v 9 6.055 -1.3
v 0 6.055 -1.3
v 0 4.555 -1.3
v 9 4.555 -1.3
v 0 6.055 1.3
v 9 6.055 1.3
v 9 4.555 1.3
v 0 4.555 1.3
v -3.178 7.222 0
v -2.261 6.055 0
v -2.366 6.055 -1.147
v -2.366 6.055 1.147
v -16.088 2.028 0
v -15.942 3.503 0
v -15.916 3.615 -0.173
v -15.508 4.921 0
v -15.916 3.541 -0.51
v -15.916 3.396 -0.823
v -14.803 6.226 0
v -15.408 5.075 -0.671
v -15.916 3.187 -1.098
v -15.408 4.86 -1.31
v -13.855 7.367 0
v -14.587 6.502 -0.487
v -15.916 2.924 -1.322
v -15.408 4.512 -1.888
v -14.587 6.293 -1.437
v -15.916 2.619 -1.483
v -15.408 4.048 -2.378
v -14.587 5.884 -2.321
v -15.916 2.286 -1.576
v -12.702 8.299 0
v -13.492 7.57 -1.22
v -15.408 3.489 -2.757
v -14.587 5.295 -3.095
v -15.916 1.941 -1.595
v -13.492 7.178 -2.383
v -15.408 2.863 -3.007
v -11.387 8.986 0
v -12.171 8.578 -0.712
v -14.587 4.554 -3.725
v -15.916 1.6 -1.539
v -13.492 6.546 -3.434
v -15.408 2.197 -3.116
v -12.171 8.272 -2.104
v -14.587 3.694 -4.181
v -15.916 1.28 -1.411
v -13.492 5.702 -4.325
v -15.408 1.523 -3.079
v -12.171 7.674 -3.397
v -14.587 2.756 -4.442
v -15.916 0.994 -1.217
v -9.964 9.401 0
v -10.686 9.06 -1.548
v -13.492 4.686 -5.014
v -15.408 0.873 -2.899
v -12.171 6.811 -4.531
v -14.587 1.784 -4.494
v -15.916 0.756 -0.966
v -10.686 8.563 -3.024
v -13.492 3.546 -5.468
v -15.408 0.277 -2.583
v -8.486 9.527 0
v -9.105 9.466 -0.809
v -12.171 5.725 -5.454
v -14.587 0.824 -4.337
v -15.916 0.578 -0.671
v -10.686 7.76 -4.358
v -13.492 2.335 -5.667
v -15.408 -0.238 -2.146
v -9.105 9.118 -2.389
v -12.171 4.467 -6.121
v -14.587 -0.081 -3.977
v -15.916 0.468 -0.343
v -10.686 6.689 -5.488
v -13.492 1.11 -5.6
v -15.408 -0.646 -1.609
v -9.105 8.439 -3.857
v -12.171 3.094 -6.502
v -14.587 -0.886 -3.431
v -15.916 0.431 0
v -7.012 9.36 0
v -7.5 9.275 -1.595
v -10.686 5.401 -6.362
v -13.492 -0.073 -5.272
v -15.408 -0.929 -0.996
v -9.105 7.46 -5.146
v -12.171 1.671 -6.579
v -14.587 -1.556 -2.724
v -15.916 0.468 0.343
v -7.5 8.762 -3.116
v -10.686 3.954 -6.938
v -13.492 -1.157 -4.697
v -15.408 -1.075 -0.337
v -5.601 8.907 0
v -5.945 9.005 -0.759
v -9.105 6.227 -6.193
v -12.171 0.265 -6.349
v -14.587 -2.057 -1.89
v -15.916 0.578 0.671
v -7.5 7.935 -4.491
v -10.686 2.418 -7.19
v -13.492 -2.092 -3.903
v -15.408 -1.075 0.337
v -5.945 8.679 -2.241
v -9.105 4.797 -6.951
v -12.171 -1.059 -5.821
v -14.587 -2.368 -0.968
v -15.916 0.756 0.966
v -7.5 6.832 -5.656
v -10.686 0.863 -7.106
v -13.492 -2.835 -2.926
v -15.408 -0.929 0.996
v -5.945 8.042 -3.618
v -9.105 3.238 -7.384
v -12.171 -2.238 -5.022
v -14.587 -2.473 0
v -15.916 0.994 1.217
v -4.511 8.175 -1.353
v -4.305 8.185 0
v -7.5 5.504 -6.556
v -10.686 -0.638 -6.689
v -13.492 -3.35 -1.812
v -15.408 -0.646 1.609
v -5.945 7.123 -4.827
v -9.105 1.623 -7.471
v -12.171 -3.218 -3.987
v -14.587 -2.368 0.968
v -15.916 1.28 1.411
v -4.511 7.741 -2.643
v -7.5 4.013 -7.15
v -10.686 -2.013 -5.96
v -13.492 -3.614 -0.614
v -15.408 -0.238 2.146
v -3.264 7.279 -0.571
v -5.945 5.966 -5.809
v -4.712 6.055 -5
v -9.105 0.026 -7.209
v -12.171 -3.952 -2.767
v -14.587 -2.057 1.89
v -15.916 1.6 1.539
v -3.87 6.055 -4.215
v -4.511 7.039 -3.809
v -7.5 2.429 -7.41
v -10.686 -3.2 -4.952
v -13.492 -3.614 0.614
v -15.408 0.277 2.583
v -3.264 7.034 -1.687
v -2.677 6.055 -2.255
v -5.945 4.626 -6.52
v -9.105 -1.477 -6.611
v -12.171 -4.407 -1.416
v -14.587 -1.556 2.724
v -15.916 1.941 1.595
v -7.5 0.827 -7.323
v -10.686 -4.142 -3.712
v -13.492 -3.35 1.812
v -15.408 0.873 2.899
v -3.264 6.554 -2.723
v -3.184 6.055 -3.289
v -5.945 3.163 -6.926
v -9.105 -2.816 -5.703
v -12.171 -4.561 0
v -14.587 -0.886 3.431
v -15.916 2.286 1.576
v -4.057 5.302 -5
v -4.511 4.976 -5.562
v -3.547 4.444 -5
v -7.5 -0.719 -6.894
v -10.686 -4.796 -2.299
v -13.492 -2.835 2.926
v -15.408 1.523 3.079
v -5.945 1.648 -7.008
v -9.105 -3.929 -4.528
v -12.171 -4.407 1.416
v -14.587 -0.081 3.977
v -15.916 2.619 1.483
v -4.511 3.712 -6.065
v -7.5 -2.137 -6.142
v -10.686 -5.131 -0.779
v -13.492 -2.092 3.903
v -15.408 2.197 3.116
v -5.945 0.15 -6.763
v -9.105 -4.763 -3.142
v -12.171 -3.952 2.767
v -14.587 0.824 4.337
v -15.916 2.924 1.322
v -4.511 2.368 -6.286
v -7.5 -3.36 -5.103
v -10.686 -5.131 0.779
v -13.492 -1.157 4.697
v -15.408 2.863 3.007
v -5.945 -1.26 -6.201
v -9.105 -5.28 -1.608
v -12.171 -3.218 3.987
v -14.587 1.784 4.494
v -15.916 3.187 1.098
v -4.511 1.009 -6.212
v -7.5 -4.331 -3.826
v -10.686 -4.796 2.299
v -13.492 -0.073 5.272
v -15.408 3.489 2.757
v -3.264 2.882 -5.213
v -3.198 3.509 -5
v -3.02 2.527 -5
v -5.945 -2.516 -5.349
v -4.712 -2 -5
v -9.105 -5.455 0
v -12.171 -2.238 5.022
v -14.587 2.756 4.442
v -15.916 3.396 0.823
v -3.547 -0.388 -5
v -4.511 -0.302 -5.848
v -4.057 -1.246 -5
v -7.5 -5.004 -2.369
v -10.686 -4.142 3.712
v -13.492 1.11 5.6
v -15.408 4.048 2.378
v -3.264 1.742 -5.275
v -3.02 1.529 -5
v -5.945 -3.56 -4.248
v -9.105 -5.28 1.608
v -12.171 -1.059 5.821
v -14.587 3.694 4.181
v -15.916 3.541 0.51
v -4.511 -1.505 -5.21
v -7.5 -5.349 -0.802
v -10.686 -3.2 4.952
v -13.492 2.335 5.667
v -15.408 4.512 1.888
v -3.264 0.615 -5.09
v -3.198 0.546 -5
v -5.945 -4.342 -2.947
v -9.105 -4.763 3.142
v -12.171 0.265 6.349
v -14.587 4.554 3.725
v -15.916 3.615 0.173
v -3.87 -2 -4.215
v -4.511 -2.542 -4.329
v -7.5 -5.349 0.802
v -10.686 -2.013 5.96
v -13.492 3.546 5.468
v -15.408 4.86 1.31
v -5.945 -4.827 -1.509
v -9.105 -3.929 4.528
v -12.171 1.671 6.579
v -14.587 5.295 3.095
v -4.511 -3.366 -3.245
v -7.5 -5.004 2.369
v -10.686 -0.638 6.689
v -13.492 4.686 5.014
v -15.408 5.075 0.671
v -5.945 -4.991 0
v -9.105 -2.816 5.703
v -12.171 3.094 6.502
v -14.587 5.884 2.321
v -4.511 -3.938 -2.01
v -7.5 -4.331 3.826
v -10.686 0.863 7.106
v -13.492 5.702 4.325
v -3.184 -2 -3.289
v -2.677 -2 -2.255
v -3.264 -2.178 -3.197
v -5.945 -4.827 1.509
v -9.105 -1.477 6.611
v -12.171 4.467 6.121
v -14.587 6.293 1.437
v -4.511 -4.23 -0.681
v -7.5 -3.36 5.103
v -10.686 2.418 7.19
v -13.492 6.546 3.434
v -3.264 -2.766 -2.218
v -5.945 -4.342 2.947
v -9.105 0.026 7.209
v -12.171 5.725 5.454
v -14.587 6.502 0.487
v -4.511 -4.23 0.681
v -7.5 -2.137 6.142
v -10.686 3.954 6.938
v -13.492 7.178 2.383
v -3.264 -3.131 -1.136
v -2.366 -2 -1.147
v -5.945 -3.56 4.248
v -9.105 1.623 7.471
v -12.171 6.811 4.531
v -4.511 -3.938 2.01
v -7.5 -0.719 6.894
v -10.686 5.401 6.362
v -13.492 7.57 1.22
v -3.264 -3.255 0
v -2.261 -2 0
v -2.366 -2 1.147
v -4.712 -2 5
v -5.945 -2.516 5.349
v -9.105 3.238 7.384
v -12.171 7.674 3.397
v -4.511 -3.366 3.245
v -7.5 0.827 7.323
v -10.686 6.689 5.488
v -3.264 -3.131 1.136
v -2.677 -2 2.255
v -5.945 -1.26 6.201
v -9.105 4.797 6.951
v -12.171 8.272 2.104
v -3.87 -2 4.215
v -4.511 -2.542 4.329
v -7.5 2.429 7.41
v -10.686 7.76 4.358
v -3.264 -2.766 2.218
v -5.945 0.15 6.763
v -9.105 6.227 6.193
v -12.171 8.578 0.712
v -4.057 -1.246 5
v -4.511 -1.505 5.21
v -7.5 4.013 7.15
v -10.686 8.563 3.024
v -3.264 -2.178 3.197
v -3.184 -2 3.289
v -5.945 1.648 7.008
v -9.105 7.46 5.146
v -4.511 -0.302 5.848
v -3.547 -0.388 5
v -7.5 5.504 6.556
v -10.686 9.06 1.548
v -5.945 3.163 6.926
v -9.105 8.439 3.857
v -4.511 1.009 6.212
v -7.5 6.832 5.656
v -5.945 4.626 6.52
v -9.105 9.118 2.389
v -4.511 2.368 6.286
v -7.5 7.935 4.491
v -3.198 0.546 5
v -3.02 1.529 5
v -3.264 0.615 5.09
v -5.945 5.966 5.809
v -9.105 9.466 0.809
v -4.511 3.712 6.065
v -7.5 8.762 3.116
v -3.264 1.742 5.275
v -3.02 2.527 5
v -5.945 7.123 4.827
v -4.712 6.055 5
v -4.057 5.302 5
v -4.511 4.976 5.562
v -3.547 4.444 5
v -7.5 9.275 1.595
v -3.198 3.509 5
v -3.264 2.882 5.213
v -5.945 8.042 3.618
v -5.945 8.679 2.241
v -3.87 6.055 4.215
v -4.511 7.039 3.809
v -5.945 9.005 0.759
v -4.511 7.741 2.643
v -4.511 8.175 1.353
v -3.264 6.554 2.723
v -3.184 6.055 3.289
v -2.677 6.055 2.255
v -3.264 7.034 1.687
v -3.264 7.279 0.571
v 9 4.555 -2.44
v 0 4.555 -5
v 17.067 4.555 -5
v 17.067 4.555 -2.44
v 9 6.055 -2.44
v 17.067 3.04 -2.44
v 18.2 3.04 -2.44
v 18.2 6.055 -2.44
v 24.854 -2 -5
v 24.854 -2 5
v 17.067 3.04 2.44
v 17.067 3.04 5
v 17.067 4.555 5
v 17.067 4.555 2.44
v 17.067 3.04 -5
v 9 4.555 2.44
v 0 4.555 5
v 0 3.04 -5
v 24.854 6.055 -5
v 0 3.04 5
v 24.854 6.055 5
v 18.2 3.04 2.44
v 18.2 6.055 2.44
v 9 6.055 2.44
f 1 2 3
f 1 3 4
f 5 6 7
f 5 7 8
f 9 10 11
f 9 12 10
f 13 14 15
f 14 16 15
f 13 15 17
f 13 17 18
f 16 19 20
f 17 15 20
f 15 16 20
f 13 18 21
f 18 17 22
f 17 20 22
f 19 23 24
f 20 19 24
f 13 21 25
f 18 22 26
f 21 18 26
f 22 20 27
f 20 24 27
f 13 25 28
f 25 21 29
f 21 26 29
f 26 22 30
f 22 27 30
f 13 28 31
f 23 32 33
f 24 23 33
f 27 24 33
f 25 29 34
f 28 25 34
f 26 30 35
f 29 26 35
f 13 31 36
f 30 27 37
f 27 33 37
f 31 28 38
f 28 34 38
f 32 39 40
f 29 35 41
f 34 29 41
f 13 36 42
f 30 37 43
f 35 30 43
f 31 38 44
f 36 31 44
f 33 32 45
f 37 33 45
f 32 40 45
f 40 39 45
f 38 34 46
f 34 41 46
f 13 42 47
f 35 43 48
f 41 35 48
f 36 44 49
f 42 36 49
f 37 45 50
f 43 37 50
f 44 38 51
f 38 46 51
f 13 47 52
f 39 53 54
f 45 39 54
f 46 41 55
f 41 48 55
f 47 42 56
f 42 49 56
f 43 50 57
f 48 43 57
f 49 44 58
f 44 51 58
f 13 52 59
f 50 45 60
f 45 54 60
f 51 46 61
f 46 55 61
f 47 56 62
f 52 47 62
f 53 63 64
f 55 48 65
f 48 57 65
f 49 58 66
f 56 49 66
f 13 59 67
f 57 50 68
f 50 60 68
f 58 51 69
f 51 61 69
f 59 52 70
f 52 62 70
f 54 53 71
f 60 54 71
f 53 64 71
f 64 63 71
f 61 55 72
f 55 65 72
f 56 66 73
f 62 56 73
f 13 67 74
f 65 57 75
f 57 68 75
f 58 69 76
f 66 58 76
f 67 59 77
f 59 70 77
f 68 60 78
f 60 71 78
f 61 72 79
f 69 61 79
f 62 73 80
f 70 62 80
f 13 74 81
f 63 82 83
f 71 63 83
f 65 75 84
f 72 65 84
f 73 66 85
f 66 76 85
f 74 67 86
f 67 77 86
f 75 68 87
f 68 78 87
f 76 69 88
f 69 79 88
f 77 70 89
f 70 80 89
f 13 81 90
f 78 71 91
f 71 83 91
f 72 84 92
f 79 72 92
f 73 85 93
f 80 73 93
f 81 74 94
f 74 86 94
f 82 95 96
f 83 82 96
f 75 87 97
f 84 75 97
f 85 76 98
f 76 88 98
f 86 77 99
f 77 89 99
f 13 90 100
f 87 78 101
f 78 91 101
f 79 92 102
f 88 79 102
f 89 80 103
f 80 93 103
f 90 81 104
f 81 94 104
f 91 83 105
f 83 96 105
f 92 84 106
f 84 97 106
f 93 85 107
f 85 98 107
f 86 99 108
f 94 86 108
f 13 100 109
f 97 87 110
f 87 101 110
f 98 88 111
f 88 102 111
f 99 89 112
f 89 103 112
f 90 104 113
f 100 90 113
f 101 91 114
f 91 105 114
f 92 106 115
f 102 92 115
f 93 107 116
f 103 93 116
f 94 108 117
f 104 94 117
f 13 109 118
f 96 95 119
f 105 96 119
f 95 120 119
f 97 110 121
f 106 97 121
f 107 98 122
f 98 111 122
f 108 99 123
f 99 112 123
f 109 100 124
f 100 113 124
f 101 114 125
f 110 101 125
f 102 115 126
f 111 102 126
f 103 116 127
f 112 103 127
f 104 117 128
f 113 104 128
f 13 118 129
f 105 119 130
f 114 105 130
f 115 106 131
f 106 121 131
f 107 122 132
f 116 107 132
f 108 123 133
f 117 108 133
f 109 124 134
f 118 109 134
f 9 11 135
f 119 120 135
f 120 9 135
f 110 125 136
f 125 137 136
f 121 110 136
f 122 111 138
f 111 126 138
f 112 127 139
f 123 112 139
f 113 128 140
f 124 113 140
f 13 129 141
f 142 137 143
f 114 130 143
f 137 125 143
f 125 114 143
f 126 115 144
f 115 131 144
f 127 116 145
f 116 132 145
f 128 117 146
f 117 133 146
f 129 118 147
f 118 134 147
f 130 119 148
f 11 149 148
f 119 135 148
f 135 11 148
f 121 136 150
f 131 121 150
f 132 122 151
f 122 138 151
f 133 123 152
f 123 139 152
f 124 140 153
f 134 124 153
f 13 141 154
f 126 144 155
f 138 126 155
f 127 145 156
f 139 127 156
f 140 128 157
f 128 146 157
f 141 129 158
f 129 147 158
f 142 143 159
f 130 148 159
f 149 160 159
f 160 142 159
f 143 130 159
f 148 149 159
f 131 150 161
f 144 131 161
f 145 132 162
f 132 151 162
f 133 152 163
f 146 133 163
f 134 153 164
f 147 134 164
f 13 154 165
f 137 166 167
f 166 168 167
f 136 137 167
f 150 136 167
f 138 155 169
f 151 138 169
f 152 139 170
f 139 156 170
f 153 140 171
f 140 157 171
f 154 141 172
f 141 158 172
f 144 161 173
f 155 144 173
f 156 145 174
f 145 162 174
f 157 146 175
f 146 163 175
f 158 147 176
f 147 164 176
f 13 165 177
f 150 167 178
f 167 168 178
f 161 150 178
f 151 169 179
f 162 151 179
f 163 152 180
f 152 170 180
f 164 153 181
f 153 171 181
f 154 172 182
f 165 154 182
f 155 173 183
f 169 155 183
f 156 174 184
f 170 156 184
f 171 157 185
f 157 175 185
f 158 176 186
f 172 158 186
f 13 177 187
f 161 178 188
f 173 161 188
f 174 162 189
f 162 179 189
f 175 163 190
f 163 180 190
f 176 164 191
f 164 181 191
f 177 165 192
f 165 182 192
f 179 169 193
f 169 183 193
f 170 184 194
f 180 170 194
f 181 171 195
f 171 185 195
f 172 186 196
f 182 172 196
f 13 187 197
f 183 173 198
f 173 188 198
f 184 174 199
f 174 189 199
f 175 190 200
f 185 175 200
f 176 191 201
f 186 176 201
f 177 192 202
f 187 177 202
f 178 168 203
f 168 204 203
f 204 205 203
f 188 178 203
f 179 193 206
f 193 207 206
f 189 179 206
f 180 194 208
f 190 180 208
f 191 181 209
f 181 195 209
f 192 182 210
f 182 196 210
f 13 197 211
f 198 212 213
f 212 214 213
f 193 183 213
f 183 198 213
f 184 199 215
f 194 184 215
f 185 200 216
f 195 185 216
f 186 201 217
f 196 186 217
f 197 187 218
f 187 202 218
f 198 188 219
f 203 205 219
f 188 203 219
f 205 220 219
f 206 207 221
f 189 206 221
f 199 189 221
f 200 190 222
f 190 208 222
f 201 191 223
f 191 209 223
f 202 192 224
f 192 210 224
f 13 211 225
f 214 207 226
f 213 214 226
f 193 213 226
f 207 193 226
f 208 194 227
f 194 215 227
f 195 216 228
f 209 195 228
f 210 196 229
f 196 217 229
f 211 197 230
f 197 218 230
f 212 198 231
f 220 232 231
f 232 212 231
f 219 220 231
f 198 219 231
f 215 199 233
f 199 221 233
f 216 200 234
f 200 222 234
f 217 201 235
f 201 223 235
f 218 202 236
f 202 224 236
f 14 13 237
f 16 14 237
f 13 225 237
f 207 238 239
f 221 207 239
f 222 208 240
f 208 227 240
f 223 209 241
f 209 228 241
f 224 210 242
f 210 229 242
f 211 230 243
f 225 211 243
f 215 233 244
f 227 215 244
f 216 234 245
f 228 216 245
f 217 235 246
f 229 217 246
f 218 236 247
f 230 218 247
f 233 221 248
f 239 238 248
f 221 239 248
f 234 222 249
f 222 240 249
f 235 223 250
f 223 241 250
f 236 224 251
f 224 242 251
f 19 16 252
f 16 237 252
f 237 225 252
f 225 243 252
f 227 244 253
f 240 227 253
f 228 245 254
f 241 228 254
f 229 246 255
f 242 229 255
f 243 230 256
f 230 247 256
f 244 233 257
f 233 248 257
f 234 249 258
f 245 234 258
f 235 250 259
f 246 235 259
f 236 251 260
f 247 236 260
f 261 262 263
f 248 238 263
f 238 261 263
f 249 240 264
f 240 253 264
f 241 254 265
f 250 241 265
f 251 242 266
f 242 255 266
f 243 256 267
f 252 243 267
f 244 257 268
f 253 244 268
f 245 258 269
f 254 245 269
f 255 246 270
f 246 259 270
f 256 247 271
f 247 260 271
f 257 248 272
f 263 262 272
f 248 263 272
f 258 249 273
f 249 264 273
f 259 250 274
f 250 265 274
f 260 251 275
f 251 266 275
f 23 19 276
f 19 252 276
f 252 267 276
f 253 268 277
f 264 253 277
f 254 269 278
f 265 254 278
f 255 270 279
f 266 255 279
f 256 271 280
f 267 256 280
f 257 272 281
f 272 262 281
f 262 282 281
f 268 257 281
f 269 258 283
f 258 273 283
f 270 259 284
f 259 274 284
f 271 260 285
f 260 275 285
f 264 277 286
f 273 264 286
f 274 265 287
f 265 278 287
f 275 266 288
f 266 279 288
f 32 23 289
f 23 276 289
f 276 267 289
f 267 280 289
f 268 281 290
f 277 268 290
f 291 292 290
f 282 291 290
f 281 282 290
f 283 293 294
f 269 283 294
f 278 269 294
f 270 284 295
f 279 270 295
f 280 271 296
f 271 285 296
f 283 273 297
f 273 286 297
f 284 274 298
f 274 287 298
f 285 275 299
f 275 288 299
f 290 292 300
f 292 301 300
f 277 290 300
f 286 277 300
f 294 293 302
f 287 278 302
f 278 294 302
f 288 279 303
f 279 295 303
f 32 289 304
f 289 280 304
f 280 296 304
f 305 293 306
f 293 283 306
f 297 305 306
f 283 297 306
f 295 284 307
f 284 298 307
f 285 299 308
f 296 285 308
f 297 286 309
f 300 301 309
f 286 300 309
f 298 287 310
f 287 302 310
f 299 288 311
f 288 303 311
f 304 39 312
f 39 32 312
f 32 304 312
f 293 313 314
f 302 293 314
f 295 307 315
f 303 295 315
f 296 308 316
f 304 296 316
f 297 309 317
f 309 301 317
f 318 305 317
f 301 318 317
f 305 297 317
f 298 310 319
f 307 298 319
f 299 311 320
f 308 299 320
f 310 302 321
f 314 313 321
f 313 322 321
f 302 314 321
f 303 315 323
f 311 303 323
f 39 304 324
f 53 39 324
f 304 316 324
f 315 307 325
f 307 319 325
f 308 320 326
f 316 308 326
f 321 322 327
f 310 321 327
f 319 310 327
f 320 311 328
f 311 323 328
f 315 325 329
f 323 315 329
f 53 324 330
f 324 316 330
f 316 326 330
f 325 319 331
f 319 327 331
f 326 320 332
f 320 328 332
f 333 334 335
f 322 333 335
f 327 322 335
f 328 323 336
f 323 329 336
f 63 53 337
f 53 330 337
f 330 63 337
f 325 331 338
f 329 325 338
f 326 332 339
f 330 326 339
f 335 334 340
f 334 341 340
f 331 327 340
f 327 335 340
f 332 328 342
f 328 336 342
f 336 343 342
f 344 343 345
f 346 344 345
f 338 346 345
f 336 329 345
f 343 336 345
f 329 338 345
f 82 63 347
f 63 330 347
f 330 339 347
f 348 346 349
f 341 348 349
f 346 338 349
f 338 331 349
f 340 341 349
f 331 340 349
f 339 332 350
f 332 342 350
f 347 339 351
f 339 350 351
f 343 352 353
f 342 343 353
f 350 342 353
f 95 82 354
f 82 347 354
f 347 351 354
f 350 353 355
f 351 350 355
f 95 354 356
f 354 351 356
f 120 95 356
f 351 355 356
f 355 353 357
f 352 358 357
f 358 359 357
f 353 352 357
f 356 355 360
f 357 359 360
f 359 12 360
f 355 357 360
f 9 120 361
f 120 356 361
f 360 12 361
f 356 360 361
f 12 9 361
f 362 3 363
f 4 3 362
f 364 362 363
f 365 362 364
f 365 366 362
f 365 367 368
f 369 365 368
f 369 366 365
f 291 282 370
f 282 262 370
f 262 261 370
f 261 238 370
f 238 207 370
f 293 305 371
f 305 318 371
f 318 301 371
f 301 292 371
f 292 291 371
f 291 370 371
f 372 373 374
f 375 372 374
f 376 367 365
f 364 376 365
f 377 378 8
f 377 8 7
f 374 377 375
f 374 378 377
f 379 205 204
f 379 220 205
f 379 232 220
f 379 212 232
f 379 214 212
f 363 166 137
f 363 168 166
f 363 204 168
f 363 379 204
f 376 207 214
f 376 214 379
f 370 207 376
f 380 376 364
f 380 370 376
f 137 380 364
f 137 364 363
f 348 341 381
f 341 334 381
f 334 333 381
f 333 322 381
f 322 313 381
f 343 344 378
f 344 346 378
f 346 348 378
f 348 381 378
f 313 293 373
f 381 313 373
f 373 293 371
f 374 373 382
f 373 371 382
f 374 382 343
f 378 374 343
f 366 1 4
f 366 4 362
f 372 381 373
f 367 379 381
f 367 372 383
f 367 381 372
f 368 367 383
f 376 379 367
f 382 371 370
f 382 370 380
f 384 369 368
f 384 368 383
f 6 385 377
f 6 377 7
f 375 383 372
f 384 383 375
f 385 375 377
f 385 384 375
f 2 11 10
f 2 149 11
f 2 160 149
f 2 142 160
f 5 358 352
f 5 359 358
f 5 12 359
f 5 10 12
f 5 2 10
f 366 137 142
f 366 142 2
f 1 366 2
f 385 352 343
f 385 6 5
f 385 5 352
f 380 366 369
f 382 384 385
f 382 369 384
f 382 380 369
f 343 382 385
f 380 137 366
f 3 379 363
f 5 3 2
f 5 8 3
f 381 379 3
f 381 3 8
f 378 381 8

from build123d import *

# Parameters (mm, degrees)
CROQUIS2_W              = 26.743660572
CROQUIS2_H              = 8.055392927
CROQUIS2_W_2            = 17.066952721
CROQUIS2_H_2            = 4.555392927
SALIENTE_EXTRUIR1_DEPTH = 5
CORTAR_EXTRUIR1_DEPTH   = 6.055393
SALIENTE_EXTRUIR2_DEPTH = 3.04
CROQUIS7_W              = 10
CROQUIS7_H              = 8.055392927
SALIENTE_EXTRUIR3_DEPTH = 3.04


with BuildPart() as part:
    # Croquis2 → Saliente-Extruir1 (new body, symmetric)
    with BuildSketch(Plane.XY):
        with Locations((11.482548502, 2.027696464)):
            Rectangle(CROQUIS2_W, CROQUIS2_H)
        with Locations((8.53347636, 2.277696464)):
            Rectangle(CROQUIS2_W_2, CROQUIS2_H_2, mode=Mode.SUBTRACT)
    extrude(amount=SALIENTE_EXTRUIR1_DEPTH, both=True)

    # Croquis3 → Cortar-Extruir1 (cut)
    with BuildSketch(Plane(origin=(0, 6.055392927, 0), x_dir=(1, 0, 0), z_dir=(0, 1, 0))):
        Polygon((9, -2.44020423), (9, -1.3), (0, -1.3), (0, 1.3), (9, 1.3), (9, 2.44020423), (18.2, 2.44020423), (18.2, -2.44020423), align=None)
    extrude(amount=-CORTAR_EXTRUIR1_DEPTH, mode=Mode.SUBTRACT)

    # Croquis4 → Saliente-Extruir2 (add)
    with BuildSketch(Plane(origin=(0, 0, 0), x_dir=(1, 0, 0), z_dir=(0, 1, 0))):
        Polygon((17.066952721, 5), (0, 5), (0, -5), (17.066952721, -5), (17.066952721, -2.44020423), (18.2, -2.44020423), (18.2, 2.44020423), (17.066952721, 2.44020423), align=None)
    extrude(amount=SALIENTE_EXTRUIR2_DEPTH)

    # Croquis6 → Revolución1 (revolve)
    with BuildSketch(Plane.XY):
        with BuildLine():
            Line((-1.088241608, 2.027696464), (-16.088241608, 2.027696464))
            ThreePointArc((-16.088241608, 2.027696464), (-8.588241608, 9.527696464), (-1.088241608, 2.027696464))
        make_face()
    revolve(axis=Axis((-1.889281784, 2.027696464, 0), (-1, 0, 0)))

    # Croquis7 → Saliente-Extruir3 (add)
    with BuildSketch(Plane.ZY.offset(1.889281784)):
        with Locations((0, 2.027696464)):
            Rectangle(CROQUIS7_W, CROQUIS7_H)
    extrude(amount=SALIENTE_EXTRUIR3_DEPTH)


solid = part.part
